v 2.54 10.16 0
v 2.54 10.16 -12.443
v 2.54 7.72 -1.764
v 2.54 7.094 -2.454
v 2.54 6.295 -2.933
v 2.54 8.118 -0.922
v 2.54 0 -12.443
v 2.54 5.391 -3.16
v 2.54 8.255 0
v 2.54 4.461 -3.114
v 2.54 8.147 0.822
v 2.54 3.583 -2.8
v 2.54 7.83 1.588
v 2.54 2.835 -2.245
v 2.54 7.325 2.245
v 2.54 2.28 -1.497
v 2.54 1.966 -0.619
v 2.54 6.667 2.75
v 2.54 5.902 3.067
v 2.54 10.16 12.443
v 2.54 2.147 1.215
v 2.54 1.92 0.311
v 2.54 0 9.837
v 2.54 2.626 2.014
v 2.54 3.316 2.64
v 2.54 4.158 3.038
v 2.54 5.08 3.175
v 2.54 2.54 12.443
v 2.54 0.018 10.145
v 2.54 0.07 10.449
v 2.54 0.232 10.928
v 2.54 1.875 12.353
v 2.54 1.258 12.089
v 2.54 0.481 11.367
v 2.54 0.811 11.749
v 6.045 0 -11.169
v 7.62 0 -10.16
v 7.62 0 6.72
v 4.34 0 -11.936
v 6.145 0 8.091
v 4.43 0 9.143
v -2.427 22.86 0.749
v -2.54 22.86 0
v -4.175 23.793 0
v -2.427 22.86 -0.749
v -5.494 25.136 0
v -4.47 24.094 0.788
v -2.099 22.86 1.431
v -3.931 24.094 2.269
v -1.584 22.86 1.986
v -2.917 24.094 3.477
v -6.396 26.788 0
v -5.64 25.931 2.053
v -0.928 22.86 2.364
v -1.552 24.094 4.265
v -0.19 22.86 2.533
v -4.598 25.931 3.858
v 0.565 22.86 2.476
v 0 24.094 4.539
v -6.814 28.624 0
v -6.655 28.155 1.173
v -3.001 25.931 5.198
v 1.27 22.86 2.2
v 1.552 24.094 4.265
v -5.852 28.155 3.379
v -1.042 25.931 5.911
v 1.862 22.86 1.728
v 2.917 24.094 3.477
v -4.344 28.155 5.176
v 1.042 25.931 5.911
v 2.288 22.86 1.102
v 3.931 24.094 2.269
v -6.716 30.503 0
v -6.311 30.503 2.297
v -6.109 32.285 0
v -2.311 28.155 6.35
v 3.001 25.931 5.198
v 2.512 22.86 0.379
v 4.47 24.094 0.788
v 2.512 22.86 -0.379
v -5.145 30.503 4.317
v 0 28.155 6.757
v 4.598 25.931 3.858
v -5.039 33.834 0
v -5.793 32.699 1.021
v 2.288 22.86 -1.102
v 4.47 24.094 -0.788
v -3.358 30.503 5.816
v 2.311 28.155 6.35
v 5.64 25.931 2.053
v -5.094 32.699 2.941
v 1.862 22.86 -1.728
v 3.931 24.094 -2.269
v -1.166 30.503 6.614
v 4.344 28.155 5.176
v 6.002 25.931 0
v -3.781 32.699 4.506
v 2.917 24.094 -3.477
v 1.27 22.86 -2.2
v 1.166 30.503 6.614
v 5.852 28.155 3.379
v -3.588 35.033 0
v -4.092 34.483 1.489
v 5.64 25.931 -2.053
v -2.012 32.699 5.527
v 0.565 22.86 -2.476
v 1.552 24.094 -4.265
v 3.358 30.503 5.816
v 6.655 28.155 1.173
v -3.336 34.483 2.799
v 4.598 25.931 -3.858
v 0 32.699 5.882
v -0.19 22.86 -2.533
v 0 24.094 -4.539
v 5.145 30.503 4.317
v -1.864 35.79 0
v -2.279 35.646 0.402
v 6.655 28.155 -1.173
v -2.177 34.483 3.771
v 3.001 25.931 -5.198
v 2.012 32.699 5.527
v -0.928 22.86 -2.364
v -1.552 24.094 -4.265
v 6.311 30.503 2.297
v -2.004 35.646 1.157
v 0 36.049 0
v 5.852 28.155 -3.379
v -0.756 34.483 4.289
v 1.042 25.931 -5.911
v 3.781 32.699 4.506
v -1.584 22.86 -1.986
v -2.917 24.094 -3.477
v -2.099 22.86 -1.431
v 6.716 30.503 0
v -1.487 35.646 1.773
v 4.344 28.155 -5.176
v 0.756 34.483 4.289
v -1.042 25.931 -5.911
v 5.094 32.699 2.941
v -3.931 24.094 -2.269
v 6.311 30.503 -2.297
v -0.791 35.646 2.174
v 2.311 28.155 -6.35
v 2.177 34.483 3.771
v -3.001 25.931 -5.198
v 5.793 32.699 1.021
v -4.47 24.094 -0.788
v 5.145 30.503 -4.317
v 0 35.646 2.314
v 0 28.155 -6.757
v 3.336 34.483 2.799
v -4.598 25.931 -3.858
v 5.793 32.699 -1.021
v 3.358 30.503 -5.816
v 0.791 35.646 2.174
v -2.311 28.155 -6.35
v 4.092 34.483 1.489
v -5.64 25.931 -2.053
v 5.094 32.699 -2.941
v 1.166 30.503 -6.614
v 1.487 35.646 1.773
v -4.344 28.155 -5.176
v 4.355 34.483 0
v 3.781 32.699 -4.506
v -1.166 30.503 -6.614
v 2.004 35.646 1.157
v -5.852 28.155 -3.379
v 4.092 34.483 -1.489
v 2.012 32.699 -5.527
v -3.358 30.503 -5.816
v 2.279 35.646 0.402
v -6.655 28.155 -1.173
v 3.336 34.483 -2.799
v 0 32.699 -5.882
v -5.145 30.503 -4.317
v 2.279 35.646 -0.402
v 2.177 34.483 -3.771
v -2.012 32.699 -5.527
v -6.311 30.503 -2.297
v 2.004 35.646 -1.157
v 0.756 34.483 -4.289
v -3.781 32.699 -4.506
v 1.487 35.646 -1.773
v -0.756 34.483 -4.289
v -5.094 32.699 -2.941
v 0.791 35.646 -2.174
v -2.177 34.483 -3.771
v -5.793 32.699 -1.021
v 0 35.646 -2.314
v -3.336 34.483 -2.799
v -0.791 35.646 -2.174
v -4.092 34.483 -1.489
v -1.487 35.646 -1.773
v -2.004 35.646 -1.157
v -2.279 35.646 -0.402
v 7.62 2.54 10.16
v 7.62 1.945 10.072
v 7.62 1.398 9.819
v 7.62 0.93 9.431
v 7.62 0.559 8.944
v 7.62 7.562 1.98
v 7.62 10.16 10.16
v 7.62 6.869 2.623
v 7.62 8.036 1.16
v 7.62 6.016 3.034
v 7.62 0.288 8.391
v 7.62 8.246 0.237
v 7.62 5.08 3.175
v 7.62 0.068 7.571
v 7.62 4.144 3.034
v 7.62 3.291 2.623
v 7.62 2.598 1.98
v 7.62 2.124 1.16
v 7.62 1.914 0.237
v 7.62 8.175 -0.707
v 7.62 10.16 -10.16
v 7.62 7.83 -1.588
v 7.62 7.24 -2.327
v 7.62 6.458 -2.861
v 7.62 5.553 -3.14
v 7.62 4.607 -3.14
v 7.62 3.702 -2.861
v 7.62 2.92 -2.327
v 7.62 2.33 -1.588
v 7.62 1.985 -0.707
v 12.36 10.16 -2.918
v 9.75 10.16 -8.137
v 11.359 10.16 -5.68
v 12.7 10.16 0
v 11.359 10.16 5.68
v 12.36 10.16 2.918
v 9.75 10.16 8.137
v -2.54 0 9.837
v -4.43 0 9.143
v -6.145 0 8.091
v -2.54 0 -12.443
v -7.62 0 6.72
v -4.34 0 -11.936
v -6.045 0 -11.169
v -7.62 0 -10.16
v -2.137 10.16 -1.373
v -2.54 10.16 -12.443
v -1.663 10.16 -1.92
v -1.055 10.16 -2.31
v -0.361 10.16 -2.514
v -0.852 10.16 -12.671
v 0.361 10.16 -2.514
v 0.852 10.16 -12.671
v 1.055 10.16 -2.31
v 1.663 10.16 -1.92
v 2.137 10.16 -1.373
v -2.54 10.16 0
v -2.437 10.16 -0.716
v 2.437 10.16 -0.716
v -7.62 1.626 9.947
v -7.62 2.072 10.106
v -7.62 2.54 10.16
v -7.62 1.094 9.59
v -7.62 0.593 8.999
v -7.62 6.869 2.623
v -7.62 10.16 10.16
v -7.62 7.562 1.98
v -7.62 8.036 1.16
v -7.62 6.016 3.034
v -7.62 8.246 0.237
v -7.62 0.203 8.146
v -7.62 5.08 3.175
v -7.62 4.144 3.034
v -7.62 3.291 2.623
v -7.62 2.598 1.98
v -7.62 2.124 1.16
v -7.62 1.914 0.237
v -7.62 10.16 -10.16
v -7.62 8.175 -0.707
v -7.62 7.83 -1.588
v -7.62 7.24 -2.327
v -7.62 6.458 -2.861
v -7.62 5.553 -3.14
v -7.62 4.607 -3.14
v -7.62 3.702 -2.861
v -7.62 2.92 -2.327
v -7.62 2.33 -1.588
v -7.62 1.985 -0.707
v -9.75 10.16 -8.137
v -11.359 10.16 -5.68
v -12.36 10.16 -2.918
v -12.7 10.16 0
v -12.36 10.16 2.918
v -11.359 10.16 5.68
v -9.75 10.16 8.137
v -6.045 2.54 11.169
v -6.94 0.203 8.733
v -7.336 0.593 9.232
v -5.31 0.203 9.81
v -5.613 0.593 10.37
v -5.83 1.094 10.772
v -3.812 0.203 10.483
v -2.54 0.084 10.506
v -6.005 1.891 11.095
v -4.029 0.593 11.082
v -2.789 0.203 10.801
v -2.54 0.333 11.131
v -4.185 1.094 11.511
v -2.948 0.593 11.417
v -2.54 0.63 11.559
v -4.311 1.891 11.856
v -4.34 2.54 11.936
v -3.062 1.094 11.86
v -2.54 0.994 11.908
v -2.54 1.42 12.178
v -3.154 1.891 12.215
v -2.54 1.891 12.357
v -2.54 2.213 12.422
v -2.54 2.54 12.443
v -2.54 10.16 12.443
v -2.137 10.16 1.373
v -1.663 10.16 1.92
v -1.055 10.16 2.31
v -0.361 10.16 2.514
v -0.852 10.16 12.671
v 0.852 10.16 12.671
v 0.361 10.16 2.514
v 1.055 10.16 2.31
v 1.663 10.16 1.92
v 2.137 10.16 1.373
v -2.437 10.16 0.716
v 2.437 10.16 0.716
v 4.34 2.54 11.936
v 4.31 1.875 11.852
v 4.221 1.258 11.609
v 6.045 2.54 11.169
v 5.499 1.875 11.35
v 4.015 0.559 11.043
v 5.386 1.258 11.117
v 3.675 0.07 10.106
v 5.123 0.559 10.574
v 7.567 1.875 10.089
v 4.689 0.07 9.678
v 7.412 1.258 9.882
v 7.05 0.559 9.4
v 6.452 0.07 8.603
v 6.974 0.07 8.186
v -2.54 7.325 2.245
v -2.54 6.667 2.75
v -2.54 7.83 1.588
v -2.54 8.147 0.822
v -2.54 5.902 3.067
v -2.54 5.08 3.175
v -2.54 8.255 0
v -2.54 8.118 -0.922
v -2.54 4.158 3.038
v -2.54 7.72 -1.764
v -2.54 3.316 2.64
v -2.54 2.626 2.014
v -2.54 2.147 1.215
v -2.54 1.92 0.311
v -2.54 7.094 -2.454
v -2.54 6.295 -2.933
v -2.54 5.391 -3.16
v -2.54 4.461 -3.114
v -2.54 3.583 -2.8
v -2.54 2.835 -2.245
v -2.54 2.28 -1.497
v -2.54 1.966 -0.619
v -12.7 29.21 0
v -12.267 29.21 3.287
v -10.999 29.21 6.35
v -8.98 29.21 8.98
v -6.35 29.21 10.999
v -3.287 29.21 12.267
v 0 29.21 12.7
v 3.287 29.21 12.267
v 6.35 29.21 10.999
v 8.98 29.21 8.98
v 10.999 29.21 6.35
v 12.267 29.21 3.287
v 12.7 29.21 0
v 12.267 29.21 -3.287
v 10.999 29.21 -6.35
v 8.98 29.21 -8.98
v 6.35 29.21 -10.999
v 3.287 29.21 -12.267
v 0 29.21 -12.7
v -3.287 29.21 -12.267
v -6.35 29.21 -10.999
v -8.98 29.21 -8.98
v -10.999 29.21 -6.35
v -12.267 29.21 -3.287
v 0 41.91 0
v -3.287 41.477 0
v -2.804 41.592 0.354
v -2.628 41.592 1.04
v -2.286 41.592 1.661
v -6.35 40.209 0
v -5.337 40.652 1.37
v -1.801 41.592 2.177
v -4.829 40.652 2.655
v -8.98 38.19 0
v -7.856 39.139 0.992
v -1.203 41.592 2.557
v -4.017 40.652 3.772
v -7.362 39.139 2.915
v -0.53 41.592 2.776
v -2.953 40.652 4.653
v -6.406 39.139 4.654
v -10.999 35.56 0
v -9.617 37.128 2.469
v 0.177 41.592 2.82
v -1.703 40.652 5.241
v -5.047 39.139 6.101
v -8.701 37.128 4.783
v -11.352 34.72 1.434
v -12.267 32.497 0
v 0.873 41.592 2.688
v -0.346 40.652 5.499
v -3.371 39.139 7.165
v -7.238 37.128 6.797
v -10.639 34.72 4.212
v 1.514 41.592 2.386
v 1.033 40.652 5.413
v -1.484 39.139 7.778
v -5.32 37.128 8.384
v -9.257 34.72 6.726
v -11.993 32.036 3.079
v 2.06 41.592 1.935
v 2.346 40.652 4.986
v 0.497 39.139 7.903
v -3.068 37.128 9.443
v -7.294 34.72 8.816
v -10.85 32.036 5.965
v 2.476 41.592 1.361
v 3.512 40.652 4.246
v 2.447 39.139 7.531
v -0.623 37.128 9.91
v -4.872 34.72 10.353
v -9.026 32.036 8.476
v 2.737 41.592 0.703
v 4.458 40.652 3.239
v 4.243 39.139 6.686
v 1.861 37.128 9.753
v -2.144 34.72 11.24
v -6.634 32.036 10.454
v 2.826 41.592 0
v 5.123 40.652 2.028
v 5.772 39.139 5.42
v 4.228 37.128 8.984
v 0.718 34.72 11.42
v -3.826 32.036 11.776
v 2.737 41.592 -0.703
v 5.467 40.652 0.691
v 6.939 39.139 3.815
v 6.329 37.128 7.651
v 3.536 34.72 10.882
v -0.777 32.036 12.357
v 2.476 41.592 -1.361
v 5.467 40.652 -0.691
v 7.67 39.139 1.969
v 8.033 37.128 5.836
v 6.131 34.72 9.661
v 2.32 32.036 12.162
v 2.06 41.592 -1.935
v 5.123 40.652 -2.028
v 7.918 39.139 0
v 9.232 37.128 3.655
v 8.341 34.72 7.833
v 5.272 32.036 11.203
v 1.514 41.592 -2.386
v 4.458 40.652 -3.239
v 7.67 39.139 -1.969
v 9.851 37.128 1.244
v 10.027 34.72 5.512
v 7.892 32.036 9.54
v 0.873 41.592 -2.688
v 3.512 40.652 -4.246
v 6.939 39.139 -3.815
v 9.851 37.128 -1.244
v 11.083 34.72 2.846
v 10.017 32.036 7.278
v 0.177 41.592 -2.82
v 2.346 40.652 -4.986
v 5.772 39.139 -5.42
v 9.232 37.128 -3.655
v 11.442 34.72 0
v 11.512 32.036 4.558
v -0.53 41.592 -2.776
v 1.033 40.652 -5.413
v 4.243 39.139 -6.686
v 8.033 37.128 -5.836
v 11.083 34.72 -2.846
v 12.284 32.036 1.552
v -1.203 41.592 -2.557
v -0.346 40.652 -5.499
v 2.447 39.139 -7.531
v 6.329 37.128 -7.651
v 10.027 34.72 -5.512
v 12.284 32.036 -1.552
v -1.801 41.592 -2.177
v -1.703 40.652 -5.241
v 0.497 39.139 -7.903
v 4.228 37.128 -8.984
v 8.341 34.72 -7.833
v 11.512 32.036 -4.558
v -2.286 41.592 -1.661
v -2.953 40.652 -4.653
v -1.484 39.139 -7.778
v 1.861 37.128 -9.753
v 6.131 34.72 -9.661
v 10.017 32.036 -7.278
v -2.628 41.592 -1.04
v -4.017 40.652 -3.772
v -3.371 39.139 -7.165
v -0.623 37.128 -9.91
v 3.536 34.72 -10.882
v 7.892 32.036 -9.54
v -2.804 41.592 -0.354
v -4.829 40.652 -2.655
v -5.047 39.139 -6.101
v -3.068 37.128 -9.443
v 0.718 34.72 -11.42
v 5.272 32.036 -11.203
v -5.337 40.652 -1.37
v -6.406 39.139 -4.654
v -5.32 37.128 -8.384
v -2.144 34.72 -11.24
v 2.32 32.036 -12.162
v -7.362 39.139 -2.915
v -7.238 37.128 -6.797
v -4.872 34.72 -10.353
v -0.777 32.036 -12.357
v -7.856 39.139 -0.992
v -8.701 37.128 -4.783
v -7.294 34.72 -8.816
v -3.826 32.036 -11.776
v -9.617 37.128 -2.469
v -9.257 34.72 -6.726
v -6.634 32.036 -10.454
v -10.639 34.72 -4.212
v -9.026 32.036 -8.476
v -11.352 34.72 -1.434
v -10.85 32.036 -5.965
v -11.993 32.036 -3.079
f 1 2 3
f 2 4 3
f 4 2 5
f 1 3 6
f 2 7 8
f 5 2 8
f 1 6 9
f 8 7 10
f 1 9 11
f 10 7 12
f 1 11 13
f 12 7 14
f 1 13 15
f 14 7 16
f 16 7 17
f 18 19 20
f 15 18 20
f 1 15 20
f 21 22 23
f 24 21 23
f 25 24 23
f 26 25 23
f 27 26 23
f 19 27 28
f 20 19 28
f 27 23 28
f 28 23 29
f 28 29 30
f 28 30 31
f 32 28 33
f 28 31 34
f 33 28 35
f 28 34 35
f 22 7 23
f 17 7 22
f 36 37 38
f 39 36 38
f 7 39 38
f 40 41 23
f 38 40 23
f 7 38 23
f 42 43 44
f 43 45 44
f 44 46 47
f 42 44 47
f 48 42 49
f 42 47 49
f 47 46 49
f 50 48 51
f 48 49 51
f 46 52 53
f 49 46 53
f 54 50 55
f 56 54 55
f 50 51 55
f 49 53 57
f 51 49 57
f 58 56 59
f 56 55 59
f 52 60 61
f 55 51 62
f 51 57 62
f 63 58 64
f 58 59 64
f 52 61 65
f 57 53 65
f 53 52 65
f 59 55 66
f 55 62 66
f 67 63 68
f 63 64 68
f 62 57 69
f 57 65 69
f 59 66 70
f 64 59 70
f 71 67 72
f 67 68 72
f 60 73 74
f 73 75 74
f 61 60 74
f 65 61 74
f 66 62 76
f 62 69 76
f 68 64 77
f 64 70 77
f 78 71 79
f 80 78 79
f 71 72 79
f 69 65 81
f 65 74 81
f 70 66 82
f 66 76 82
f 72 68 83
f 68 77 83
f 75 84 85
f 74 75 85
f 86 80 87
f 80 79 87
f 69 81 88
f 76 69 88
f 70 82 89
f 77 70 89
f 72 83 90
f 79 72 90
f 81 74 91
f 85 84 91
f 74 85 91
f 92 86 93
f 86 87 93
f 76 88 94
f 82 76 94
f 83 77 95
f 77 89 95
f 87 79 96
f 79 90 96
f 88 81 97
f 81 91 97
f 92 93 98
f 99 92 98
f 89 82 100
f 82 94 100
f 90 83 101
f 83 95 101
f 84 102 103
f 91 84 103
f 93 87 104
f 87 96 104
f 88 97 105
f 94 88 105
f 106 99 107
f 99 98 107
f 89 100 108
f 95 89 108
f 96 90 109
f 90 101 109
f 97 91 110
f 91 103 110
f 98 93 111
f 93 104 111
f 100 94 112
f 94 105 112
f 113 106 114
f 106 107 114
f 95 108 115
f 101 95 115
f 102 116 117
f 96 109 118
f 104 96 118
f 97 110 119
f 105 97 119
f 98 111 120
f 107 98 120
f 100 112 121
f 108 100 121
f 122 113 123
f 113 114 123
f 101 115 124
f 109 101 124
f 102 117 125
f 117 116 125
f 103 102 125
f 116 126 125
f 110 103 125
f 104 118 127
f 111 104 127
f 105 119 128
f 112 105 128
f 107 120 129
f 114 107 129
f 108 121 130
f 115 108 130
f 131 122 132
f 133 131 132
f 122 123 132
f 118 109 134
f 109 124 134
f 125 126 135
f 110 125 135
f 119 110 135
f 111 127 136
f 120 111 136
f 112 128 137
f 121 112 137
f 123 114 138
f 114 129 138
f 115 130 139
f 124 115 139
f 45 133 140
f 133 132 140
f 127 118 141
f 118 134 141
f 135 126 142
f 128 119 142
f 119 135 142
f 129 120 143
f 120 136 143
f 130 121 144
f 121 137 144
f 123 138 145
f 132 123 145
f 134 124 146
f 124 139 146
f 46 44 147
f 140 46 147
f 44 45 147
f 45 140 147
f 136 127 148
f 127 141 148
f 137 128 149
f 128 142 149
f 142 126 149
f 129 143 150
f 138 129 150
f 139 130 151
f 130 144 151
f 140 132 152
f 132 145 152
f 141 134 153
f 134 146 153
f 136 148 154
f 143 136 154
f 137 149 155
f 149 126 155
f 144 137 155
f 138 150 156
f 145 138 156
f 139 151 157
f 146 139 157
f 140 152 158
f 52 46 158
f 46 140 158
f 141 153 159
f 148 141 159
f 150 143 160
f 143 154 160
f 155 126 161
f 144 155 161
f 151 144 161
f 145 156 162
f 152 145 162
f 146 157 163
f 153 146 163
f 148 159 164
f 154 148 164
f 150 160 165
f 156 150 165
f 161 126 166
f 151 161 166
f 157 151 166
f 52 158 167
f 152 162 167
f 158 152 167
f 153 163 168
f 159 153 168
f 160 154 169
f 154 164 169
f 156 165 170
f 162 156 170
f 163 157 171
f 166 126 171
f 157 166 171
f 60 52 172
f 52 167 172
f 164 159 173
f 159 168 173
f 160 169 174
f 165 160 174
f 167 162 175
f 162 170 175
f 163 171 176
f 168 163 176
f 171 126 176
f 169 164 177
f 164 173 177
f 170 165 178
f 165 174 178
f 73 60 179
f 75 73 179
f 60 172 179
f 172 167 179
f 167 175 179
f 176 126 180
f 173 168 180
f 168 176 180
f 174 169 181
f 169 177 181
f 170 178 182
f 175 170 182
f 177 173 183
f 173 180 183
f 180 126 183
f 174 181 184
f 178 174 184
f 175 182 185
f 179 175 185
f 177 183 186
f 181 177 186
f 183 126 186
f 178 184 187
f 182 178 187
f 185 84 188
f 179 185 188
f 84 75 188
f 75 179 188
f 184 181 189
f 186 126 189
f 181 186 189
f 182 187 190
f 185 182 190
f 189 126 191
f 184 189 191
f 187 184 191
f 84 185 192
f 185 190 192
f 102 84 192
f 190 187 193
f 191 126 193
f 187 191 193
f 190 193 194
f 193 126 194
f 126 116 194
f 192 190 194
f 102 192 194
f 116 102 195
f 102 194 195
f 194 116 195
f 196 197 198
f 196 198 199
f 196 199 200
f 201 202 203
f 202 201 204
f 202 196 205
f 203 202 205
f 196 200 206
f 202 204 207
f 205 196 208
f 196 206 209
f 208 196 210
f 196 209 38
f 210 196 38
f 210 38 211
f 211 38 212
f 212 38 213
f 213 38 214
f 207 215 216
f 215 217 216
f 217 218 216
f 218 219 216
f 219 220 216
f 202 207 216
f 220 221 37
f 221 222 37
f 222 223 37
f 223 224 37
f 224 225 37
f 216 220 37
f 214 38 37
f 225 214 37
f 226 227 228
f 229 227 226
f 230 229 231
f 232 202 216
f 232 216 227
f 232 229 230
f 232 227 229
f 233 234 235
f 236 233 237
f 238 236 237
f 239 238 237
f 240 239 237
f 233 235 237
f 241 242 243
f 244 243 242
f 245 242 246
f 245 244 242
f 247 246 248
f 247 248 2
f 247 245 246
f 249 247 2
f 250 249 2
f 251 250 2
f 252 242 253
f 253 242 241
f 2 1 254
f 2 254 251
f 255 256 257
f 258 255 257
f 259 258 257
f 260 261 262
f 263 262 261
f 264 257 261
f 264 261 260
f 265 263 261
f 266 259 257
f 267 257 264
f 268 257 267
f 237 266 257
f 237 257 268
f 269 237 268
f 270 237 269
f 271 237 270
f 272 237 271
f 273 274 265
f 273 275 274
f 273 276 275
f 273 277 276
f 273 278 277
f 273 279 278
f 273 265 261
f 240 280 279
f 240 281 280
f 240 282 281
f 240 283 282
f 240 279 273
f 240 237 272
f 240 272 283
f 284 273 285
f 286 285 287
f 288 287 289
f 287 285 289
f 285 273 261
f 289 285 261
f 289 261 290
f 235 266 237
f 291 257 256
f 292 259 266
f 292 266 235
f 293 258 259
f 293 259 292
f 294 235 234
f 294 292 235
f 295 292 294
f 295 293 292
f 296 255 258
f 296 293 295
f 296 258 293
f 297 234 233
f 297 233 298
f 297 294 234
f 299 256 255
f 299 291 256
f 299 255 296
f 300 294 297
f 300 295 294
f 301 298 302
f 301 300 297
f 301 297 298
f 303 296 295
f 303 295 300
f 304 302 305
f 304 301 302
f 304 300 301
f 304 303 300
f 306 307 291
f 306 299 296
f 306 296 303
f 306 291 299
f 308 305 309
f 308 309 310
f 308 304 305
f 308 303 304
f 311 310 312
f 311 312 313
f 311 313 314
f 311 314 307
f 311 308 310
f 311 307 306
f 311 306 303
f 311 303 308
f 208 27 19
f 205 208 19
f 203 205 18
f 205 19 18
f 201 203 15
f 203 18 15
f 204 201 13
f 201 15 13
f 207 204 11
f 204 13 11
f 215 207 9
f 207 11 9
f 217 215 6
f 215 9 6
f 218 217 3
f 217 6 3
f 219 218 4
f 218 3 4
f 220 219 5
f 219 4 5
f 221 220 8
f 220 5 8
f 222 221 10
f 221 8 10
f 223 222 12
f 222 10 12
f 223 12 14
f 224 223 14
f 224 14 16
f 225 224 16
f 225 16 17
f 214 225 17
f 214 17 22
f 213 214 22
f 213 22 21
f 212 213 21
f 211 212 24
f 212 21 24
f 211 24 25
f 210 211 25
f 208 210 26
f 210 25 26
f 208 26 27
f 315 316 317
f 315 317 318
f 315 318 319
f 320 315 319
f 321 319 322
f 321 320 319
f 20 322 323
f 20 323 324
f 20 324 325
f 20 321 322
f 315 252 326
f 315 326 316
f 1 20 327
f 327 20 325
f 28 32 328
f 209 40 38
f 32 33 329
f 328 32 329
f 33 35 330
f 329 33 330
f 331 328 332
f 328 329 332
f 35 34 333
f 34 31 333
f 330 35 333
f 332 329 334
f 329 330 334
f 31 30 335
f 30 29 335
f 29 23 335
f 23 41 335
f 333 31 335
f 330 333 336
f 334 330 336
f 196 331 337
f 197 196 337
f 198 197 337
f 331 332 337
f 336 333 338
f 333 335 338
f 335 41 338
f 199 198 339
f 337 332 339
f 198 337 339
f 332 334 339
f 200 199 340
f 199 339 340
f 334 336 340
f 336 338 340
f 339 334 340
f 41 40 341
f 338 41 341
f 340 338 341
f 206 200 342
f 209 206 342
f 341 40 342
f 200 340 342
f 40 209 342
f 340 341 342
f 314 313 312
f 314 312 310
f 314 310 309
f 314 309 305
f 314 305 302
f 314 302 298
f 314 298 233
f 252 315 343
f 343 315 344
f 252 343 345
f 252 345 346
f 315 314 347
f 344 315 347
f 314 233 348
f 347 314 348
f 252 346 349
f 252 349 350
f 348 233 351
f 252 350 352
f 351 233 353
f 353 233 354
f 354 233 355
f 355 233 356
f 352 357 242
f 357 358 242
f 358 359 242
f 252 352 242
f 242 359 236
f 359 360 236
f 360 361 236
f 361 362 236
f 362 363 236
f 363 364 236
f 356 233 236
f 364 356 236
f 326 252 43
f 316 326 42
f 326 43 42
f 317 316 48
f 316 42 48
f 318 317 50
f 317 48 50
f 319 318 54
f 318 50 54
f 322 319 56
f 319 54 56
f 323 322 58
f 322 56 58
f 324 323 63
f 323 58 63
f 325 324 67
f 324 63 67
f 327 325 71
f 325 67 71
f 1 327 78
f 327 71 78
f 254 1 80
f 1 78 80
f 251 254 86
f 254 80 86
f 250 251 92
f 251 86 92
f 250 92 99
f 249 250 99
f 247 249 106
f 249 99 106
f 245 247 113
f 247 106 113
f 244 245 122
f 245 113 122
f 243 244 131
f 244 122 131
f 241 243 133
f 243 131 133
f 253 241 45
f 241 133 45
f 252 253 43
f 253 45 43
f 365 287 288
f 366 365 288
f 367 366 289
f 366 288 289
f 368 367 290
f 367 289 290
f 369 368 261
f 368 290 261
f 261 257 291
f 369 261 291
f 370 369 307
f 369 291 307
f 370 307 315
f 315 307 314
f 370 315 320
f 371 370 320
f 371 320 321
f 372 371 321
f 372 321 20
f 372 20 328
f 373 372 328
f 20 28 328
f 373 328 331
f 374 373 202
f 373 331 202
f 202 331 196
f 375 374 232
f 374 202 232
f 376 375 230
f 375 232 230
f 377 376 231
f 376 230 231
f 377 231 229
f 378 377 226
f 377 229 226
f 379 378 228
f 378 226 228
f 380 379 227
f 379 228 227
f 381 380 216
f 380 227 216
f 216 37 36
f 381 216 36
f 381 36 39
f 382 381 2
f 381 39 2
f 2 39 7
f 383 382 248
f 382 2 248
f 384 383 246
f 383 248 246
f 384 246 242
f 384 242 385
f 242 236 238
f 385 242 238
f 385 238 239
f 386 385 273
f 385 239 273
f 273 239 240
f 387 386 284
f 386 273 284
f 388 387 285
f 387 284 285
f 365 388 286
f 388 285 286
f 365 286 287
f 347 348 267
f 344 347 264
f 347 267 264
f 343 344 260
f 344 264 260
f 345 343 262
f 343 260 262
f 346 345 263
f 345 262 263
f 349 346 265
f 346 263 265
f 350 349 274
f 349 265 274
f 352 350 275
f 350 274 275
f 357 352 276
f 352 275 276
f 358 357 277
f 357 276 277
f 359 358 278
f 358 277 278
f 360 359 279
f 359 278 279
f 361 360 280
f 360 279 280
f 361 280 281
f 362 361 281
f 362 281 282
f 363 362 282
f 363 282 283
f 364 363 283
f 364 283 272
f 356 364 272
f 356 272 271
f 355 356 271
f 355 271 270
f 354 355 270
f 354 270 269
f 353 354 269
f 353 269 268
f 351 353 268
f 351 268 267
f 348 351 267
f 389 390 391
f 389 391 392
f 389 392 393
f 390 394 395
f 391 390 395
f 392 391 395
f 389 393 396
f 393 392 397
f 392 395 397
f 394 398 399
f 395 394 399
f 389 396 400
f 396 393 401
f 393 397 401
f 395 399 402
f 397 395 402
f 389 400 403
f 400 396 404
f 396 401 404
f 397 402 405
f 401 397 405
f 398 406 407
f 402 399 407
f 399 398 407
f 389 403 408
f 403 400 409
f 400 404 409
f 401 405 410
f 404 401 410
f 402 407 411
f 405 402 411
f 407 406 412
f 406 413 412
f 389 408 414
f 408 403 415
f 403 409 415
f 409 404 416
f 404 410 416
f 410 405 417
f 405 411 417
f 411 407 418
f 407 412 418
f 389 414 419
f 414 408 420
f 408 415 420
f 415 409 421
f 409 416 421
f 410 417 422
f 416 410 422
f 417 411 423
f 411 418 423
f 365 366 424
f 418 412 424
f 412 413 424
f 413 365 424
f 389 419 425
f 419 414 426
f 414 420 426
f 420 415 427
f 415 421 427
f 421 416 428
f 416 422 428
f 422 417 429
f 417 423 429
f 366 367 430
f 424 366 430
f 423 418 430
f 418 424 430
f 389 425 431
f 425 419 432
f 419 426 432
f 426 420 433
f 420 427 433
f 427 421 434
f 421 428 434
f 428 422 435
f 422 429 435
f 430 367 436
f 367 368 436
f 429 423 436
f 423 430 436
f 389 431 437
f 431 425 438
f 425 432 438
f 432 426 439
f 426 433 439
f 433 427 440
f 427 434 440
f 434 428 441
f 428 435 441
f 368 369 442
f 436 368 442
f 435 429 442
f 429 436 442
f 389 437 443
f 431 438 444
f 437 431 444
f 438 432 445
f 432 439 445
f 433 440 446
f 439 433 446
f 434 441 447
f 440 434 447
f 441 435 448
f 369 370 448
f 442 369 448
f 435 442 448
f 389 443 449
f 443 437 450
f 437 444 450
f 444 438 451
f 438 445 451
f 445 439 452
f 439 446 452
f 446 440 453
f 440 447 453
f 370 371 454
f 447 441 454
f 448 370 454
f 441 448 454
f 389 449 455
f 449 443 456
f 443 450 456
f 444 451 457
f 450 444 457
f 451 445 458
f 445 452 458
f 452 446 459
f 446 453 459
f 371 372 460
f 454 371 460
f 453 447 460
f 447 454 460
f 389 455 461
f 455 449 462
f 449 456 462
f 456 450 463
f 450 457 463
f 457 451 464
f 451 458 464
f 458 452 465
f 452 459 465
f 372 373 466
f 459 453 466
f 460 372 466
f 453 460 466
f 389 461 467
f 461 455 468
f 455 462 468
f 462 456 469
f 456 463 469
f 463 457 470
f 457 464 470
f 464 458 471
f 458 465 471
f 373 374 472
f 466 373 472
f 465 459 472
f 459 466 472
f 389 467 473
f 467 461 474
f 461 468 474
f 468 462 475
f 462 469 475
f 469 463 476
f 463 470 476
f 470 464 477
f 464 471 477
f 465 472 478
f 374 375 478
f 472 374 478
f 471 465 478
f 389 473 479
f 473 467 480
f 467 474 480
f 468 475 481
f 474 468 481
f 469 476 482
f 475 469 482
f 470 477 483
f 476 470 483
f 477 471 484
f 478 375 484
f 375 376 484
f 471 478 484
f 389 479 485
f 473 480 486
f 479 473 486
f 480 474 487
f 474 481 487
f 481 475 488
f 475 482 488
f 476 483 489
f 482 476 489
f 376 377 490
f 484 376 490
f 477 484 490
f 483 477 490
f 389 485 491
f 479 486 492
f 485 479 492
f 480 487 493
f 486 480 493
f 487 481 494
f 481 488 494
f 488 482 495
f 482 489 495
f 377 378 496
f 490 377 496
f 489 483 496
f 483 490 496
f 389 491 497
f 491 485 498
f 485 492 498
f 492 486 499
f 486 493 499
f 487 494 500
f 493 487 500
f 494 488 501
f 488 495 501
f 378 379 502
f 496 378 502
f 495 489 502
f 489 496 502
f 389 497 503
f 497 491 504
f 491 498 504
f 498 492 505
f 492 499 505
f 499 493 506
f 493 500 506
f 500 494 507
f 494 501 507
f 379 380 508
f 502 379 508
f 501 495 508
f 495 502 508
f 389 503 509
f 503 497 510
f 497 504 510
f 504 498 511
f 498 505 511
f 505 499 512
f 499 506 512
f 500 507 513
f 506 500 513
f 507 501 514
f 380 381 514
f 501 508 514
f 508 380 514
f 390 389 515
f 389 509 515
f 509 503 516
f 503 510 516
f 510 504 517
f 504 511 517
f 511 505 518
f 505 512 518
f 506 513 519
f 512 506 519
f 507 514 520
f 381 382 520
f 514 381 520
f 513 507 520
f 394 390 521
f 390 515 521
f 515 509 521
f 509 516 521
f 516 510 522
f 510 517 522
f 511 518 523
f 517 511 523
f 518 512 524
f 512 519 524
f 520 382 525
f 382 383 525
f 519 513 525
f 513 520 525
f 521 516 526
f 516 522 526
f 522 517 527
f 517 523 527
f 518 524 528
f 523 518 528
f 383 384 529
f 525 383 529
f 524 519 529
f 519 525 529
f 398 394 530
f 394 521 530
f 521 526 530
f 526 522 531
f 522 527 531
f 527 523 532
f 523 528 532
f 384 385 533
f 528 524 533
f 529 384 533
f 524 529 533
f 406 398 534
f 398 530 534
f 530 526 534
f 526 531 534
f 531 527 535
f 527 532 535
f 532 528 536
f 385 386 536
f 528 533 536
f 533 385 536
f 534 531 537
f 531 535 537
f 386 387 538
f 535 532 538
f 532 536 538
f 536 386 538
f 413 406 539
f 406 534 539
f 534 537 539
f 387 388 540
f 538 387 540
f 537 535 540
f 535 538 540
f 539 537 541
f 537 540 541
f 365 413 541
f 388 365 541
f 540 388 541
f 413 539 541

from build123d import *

# Parameters (mm, degrees)
CUT_EXTRUDE1_DEPTH = 10.16
SKETCH3_R          = 3.175
CUT_EXTRUDE2_DEPTH = 49.276707634
FILLET1_R          = 2.54


with BuildPart() as part:
    # Sketch1 → Revolve1 (revolve)
    with BuildSketch(Plane.XY):
        with BuildLine():
            Line((0, 0), (0, 5.602635041))
            Line((0, 5.602635041), (-2.54, 5.602635041))
            Line((-2.54, 5.602635041), (-2.54, 22.86))
            ThreePointArc((-2.54, 22.86), (-6.715756159, 30.503336463), (0, 36.049159305))
            Line((0, 36.049159305), (0, 41.91))
            ThreePointArc((0, 41.91), (-8.980256121, 38.190256121), (-12.7, 29.21))
            Line((-12.7, 29.21), (-12.7, 0))
            Line((-12.7, 0), (0, 0))
        make_face()
    revolve(axis=Axis((0, 0, 0), (0, 1, 0)))

    # Sketch2 → Cut-Extrude1 (cut)
    with BuildSketch(Plane.XZ):
        with BuildLine():
            Line((-2.54, 12.443407893), (-2.54, -12.443407893))
            ThreePointArc((-2.54, -12.443407893), (0, -12.7), (2.54, -12.443407893))
            Line((2.54, -12.443407893), (2.54, 12.443407893))
            ThreePointArc((2.54, 12.443407893), (0, 12.7), (-2.54, 12.443407893))
        make_face()
        with BuildLine():
            Line((-7.62, 10.16), (-7.62, -10.16))
            ThreePointArc((-7.62, -10.16), (-12.7, 0), (-7.62, 10.16))
        make_face()
        with BuildLine():
            Line((7.62, 10.16), (7.62, -10.16))
            ThreePointArc((7.62, -10.16), (12.7, 0), (7.62, 10.16))
        make_face()
    extrude(amount=-CUT_EXTRUDE1_DEPTH, mode=Mode.SUBTRACT)

    # Sketch3 → Cut-Extrude2 (cut, through all)
    with BuildSketch(Plane.ZY.offset(7.62)):
        with Locations((0, 5.08)):
            Circle(SKETCH3_R)
    extrude(amount=-CUT_EXTRUDE2_DEPTH, mode=Mode.SUBTRACT)

    # Fillet1
    fillet1_edges = [part.edges().sort_by_distance(p)[0] for p in [
        (5.206715654, 0, 11.583613948),
        (-5.206715654, 0, 11.583613948),
    ]]
    fillet(fillet1_edges, radius=FILLET1_R)


solid = part.part
